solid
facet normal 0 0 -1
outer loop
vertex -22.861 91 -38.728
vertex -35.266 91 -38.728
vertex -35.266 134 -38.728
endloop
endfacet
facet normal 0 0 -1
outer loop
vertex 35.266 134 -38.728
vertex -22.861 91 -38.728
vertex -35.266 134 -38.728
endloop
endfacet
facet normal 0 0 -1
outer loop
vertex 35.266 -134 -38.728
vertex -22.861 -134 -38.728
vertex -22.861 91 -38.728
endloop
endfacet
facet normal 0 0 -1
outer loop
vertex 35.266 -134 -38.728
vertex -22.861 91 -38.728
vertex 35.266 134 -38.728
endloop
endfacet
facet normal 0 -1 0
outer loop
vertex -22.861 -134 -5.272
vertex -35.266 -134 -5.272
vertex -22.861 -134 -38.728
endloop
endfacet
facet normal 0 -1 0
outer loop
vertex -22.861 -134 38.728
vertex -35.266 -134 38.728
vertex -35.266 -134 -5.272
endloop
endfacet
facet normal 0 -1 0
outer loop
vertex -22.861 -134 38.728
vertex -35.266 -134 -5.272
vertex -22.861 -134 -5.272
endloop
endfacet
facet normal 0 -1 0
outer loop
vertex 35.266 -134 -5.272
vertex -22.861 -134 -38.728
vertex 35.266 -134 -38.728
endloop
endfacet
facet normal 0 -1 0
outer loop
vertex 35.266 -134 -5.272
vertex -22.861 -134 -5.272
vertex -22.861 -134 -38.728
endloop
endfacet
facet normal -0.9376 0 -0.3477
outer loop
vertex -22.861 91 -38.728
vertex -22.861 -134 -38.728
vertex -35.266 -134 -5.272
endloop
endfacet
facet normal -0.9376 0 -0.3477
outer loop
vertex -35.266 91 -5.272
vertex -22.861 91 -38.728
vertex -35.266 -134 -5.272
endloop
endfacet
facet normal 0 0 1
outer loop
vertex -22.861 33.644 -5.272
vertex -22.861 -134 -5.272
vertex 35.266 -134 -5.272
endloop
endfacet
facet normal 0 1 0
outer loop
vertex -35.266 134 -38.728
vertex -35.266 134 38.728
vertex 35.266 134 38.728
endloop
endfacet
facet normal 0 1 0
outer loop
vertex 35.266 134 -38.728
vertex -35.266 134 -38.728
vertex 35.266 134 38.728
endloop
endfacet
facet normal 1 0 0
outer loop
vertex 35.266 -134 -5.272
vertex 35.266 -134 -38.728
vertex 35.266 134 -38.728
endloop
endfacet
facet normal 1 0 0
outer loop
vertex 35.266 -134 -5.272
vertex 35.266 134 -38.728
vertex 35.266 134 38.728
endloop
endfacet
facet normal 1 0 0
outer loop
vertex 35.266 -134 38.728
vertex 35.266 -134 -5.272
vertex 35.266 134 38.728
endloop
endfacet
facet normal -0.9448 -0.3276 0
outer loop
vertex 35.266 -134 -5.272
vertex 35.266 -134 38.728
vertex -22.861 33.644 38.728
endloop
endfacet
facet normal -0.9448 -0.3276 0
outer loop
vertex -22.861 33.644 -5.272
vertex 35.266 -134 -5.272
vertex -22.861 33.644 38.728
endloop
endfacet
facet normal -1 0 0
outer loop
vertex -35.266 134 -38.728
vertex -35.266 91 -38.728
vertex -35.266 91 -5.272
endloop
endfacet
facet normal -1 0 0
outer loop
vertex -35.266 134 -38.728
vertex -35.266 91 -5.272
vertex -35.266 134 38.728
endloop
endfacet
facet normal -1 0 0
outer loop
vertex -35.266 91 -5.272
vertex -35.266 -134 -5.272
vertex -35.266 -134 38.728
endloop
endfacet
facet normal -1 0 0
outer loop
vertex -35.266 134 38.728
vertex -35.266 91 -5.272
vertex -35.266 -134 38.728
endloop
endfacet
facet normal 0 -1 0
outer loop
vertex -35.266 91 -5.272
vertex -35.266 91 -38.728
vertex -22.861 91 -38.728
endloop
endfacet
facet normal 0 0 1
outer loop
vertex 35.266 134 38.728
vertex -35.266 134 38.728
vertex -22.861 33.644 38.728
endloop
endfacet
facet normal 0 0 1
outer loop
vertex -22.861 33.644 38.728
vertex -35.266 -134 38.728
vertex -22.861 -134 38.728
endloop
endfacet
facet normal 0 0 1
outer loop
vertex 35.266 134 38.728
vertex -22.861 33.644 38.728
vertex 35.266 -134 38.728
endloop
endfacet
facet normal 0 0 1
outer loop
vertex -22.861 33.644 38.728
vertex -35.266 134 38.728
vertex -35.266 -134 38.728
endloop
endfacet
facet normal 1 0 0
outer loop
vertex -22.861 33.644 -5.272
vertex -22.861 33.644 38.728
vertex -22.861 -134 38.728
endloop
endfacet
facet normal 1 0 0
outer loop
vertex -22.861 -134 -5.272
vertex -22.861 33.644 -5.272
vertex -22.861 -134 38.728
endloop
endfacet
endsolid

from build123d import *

# Parameters (mm, degrees)
F0_W     = 70.53198
F0_H     = 77.455252
F1_DEPTH = 134
F3_DEPTH = 44
F5_DEPTH = 225


with BuildPart() as f1:
    # F0 (on Front) → F1 (new body, symmetric)
    with BuildSketch(Plane.XZ):
        Rectangle(F0_W, F0_H)
    extrude(amount=F1_DEPTH, both=True)

    # F2 (on face) → F3 (cut)
    with BuildSketch(Plane.XY.offset(38.727626)):
        Polygon((-22.860736, 33.643957), (-22.860736, -134), (35.26599, -134), align=None)
    extrude(amount=-F3_DEPTH, mode=Mode.SUBTRACT)

    # F4 (on face) → F5 (cut)
    with BuildSketch(Plane.XZ.offset(134)):
        Polygon((-22.860736, -38.727626), (-35.26599, -5.272374), (-35.26599, -38.727626), align=None)
    extrude(amount=-F5_DEPTH, mode=Mode.SUBTRACT)


solid = f1.part
